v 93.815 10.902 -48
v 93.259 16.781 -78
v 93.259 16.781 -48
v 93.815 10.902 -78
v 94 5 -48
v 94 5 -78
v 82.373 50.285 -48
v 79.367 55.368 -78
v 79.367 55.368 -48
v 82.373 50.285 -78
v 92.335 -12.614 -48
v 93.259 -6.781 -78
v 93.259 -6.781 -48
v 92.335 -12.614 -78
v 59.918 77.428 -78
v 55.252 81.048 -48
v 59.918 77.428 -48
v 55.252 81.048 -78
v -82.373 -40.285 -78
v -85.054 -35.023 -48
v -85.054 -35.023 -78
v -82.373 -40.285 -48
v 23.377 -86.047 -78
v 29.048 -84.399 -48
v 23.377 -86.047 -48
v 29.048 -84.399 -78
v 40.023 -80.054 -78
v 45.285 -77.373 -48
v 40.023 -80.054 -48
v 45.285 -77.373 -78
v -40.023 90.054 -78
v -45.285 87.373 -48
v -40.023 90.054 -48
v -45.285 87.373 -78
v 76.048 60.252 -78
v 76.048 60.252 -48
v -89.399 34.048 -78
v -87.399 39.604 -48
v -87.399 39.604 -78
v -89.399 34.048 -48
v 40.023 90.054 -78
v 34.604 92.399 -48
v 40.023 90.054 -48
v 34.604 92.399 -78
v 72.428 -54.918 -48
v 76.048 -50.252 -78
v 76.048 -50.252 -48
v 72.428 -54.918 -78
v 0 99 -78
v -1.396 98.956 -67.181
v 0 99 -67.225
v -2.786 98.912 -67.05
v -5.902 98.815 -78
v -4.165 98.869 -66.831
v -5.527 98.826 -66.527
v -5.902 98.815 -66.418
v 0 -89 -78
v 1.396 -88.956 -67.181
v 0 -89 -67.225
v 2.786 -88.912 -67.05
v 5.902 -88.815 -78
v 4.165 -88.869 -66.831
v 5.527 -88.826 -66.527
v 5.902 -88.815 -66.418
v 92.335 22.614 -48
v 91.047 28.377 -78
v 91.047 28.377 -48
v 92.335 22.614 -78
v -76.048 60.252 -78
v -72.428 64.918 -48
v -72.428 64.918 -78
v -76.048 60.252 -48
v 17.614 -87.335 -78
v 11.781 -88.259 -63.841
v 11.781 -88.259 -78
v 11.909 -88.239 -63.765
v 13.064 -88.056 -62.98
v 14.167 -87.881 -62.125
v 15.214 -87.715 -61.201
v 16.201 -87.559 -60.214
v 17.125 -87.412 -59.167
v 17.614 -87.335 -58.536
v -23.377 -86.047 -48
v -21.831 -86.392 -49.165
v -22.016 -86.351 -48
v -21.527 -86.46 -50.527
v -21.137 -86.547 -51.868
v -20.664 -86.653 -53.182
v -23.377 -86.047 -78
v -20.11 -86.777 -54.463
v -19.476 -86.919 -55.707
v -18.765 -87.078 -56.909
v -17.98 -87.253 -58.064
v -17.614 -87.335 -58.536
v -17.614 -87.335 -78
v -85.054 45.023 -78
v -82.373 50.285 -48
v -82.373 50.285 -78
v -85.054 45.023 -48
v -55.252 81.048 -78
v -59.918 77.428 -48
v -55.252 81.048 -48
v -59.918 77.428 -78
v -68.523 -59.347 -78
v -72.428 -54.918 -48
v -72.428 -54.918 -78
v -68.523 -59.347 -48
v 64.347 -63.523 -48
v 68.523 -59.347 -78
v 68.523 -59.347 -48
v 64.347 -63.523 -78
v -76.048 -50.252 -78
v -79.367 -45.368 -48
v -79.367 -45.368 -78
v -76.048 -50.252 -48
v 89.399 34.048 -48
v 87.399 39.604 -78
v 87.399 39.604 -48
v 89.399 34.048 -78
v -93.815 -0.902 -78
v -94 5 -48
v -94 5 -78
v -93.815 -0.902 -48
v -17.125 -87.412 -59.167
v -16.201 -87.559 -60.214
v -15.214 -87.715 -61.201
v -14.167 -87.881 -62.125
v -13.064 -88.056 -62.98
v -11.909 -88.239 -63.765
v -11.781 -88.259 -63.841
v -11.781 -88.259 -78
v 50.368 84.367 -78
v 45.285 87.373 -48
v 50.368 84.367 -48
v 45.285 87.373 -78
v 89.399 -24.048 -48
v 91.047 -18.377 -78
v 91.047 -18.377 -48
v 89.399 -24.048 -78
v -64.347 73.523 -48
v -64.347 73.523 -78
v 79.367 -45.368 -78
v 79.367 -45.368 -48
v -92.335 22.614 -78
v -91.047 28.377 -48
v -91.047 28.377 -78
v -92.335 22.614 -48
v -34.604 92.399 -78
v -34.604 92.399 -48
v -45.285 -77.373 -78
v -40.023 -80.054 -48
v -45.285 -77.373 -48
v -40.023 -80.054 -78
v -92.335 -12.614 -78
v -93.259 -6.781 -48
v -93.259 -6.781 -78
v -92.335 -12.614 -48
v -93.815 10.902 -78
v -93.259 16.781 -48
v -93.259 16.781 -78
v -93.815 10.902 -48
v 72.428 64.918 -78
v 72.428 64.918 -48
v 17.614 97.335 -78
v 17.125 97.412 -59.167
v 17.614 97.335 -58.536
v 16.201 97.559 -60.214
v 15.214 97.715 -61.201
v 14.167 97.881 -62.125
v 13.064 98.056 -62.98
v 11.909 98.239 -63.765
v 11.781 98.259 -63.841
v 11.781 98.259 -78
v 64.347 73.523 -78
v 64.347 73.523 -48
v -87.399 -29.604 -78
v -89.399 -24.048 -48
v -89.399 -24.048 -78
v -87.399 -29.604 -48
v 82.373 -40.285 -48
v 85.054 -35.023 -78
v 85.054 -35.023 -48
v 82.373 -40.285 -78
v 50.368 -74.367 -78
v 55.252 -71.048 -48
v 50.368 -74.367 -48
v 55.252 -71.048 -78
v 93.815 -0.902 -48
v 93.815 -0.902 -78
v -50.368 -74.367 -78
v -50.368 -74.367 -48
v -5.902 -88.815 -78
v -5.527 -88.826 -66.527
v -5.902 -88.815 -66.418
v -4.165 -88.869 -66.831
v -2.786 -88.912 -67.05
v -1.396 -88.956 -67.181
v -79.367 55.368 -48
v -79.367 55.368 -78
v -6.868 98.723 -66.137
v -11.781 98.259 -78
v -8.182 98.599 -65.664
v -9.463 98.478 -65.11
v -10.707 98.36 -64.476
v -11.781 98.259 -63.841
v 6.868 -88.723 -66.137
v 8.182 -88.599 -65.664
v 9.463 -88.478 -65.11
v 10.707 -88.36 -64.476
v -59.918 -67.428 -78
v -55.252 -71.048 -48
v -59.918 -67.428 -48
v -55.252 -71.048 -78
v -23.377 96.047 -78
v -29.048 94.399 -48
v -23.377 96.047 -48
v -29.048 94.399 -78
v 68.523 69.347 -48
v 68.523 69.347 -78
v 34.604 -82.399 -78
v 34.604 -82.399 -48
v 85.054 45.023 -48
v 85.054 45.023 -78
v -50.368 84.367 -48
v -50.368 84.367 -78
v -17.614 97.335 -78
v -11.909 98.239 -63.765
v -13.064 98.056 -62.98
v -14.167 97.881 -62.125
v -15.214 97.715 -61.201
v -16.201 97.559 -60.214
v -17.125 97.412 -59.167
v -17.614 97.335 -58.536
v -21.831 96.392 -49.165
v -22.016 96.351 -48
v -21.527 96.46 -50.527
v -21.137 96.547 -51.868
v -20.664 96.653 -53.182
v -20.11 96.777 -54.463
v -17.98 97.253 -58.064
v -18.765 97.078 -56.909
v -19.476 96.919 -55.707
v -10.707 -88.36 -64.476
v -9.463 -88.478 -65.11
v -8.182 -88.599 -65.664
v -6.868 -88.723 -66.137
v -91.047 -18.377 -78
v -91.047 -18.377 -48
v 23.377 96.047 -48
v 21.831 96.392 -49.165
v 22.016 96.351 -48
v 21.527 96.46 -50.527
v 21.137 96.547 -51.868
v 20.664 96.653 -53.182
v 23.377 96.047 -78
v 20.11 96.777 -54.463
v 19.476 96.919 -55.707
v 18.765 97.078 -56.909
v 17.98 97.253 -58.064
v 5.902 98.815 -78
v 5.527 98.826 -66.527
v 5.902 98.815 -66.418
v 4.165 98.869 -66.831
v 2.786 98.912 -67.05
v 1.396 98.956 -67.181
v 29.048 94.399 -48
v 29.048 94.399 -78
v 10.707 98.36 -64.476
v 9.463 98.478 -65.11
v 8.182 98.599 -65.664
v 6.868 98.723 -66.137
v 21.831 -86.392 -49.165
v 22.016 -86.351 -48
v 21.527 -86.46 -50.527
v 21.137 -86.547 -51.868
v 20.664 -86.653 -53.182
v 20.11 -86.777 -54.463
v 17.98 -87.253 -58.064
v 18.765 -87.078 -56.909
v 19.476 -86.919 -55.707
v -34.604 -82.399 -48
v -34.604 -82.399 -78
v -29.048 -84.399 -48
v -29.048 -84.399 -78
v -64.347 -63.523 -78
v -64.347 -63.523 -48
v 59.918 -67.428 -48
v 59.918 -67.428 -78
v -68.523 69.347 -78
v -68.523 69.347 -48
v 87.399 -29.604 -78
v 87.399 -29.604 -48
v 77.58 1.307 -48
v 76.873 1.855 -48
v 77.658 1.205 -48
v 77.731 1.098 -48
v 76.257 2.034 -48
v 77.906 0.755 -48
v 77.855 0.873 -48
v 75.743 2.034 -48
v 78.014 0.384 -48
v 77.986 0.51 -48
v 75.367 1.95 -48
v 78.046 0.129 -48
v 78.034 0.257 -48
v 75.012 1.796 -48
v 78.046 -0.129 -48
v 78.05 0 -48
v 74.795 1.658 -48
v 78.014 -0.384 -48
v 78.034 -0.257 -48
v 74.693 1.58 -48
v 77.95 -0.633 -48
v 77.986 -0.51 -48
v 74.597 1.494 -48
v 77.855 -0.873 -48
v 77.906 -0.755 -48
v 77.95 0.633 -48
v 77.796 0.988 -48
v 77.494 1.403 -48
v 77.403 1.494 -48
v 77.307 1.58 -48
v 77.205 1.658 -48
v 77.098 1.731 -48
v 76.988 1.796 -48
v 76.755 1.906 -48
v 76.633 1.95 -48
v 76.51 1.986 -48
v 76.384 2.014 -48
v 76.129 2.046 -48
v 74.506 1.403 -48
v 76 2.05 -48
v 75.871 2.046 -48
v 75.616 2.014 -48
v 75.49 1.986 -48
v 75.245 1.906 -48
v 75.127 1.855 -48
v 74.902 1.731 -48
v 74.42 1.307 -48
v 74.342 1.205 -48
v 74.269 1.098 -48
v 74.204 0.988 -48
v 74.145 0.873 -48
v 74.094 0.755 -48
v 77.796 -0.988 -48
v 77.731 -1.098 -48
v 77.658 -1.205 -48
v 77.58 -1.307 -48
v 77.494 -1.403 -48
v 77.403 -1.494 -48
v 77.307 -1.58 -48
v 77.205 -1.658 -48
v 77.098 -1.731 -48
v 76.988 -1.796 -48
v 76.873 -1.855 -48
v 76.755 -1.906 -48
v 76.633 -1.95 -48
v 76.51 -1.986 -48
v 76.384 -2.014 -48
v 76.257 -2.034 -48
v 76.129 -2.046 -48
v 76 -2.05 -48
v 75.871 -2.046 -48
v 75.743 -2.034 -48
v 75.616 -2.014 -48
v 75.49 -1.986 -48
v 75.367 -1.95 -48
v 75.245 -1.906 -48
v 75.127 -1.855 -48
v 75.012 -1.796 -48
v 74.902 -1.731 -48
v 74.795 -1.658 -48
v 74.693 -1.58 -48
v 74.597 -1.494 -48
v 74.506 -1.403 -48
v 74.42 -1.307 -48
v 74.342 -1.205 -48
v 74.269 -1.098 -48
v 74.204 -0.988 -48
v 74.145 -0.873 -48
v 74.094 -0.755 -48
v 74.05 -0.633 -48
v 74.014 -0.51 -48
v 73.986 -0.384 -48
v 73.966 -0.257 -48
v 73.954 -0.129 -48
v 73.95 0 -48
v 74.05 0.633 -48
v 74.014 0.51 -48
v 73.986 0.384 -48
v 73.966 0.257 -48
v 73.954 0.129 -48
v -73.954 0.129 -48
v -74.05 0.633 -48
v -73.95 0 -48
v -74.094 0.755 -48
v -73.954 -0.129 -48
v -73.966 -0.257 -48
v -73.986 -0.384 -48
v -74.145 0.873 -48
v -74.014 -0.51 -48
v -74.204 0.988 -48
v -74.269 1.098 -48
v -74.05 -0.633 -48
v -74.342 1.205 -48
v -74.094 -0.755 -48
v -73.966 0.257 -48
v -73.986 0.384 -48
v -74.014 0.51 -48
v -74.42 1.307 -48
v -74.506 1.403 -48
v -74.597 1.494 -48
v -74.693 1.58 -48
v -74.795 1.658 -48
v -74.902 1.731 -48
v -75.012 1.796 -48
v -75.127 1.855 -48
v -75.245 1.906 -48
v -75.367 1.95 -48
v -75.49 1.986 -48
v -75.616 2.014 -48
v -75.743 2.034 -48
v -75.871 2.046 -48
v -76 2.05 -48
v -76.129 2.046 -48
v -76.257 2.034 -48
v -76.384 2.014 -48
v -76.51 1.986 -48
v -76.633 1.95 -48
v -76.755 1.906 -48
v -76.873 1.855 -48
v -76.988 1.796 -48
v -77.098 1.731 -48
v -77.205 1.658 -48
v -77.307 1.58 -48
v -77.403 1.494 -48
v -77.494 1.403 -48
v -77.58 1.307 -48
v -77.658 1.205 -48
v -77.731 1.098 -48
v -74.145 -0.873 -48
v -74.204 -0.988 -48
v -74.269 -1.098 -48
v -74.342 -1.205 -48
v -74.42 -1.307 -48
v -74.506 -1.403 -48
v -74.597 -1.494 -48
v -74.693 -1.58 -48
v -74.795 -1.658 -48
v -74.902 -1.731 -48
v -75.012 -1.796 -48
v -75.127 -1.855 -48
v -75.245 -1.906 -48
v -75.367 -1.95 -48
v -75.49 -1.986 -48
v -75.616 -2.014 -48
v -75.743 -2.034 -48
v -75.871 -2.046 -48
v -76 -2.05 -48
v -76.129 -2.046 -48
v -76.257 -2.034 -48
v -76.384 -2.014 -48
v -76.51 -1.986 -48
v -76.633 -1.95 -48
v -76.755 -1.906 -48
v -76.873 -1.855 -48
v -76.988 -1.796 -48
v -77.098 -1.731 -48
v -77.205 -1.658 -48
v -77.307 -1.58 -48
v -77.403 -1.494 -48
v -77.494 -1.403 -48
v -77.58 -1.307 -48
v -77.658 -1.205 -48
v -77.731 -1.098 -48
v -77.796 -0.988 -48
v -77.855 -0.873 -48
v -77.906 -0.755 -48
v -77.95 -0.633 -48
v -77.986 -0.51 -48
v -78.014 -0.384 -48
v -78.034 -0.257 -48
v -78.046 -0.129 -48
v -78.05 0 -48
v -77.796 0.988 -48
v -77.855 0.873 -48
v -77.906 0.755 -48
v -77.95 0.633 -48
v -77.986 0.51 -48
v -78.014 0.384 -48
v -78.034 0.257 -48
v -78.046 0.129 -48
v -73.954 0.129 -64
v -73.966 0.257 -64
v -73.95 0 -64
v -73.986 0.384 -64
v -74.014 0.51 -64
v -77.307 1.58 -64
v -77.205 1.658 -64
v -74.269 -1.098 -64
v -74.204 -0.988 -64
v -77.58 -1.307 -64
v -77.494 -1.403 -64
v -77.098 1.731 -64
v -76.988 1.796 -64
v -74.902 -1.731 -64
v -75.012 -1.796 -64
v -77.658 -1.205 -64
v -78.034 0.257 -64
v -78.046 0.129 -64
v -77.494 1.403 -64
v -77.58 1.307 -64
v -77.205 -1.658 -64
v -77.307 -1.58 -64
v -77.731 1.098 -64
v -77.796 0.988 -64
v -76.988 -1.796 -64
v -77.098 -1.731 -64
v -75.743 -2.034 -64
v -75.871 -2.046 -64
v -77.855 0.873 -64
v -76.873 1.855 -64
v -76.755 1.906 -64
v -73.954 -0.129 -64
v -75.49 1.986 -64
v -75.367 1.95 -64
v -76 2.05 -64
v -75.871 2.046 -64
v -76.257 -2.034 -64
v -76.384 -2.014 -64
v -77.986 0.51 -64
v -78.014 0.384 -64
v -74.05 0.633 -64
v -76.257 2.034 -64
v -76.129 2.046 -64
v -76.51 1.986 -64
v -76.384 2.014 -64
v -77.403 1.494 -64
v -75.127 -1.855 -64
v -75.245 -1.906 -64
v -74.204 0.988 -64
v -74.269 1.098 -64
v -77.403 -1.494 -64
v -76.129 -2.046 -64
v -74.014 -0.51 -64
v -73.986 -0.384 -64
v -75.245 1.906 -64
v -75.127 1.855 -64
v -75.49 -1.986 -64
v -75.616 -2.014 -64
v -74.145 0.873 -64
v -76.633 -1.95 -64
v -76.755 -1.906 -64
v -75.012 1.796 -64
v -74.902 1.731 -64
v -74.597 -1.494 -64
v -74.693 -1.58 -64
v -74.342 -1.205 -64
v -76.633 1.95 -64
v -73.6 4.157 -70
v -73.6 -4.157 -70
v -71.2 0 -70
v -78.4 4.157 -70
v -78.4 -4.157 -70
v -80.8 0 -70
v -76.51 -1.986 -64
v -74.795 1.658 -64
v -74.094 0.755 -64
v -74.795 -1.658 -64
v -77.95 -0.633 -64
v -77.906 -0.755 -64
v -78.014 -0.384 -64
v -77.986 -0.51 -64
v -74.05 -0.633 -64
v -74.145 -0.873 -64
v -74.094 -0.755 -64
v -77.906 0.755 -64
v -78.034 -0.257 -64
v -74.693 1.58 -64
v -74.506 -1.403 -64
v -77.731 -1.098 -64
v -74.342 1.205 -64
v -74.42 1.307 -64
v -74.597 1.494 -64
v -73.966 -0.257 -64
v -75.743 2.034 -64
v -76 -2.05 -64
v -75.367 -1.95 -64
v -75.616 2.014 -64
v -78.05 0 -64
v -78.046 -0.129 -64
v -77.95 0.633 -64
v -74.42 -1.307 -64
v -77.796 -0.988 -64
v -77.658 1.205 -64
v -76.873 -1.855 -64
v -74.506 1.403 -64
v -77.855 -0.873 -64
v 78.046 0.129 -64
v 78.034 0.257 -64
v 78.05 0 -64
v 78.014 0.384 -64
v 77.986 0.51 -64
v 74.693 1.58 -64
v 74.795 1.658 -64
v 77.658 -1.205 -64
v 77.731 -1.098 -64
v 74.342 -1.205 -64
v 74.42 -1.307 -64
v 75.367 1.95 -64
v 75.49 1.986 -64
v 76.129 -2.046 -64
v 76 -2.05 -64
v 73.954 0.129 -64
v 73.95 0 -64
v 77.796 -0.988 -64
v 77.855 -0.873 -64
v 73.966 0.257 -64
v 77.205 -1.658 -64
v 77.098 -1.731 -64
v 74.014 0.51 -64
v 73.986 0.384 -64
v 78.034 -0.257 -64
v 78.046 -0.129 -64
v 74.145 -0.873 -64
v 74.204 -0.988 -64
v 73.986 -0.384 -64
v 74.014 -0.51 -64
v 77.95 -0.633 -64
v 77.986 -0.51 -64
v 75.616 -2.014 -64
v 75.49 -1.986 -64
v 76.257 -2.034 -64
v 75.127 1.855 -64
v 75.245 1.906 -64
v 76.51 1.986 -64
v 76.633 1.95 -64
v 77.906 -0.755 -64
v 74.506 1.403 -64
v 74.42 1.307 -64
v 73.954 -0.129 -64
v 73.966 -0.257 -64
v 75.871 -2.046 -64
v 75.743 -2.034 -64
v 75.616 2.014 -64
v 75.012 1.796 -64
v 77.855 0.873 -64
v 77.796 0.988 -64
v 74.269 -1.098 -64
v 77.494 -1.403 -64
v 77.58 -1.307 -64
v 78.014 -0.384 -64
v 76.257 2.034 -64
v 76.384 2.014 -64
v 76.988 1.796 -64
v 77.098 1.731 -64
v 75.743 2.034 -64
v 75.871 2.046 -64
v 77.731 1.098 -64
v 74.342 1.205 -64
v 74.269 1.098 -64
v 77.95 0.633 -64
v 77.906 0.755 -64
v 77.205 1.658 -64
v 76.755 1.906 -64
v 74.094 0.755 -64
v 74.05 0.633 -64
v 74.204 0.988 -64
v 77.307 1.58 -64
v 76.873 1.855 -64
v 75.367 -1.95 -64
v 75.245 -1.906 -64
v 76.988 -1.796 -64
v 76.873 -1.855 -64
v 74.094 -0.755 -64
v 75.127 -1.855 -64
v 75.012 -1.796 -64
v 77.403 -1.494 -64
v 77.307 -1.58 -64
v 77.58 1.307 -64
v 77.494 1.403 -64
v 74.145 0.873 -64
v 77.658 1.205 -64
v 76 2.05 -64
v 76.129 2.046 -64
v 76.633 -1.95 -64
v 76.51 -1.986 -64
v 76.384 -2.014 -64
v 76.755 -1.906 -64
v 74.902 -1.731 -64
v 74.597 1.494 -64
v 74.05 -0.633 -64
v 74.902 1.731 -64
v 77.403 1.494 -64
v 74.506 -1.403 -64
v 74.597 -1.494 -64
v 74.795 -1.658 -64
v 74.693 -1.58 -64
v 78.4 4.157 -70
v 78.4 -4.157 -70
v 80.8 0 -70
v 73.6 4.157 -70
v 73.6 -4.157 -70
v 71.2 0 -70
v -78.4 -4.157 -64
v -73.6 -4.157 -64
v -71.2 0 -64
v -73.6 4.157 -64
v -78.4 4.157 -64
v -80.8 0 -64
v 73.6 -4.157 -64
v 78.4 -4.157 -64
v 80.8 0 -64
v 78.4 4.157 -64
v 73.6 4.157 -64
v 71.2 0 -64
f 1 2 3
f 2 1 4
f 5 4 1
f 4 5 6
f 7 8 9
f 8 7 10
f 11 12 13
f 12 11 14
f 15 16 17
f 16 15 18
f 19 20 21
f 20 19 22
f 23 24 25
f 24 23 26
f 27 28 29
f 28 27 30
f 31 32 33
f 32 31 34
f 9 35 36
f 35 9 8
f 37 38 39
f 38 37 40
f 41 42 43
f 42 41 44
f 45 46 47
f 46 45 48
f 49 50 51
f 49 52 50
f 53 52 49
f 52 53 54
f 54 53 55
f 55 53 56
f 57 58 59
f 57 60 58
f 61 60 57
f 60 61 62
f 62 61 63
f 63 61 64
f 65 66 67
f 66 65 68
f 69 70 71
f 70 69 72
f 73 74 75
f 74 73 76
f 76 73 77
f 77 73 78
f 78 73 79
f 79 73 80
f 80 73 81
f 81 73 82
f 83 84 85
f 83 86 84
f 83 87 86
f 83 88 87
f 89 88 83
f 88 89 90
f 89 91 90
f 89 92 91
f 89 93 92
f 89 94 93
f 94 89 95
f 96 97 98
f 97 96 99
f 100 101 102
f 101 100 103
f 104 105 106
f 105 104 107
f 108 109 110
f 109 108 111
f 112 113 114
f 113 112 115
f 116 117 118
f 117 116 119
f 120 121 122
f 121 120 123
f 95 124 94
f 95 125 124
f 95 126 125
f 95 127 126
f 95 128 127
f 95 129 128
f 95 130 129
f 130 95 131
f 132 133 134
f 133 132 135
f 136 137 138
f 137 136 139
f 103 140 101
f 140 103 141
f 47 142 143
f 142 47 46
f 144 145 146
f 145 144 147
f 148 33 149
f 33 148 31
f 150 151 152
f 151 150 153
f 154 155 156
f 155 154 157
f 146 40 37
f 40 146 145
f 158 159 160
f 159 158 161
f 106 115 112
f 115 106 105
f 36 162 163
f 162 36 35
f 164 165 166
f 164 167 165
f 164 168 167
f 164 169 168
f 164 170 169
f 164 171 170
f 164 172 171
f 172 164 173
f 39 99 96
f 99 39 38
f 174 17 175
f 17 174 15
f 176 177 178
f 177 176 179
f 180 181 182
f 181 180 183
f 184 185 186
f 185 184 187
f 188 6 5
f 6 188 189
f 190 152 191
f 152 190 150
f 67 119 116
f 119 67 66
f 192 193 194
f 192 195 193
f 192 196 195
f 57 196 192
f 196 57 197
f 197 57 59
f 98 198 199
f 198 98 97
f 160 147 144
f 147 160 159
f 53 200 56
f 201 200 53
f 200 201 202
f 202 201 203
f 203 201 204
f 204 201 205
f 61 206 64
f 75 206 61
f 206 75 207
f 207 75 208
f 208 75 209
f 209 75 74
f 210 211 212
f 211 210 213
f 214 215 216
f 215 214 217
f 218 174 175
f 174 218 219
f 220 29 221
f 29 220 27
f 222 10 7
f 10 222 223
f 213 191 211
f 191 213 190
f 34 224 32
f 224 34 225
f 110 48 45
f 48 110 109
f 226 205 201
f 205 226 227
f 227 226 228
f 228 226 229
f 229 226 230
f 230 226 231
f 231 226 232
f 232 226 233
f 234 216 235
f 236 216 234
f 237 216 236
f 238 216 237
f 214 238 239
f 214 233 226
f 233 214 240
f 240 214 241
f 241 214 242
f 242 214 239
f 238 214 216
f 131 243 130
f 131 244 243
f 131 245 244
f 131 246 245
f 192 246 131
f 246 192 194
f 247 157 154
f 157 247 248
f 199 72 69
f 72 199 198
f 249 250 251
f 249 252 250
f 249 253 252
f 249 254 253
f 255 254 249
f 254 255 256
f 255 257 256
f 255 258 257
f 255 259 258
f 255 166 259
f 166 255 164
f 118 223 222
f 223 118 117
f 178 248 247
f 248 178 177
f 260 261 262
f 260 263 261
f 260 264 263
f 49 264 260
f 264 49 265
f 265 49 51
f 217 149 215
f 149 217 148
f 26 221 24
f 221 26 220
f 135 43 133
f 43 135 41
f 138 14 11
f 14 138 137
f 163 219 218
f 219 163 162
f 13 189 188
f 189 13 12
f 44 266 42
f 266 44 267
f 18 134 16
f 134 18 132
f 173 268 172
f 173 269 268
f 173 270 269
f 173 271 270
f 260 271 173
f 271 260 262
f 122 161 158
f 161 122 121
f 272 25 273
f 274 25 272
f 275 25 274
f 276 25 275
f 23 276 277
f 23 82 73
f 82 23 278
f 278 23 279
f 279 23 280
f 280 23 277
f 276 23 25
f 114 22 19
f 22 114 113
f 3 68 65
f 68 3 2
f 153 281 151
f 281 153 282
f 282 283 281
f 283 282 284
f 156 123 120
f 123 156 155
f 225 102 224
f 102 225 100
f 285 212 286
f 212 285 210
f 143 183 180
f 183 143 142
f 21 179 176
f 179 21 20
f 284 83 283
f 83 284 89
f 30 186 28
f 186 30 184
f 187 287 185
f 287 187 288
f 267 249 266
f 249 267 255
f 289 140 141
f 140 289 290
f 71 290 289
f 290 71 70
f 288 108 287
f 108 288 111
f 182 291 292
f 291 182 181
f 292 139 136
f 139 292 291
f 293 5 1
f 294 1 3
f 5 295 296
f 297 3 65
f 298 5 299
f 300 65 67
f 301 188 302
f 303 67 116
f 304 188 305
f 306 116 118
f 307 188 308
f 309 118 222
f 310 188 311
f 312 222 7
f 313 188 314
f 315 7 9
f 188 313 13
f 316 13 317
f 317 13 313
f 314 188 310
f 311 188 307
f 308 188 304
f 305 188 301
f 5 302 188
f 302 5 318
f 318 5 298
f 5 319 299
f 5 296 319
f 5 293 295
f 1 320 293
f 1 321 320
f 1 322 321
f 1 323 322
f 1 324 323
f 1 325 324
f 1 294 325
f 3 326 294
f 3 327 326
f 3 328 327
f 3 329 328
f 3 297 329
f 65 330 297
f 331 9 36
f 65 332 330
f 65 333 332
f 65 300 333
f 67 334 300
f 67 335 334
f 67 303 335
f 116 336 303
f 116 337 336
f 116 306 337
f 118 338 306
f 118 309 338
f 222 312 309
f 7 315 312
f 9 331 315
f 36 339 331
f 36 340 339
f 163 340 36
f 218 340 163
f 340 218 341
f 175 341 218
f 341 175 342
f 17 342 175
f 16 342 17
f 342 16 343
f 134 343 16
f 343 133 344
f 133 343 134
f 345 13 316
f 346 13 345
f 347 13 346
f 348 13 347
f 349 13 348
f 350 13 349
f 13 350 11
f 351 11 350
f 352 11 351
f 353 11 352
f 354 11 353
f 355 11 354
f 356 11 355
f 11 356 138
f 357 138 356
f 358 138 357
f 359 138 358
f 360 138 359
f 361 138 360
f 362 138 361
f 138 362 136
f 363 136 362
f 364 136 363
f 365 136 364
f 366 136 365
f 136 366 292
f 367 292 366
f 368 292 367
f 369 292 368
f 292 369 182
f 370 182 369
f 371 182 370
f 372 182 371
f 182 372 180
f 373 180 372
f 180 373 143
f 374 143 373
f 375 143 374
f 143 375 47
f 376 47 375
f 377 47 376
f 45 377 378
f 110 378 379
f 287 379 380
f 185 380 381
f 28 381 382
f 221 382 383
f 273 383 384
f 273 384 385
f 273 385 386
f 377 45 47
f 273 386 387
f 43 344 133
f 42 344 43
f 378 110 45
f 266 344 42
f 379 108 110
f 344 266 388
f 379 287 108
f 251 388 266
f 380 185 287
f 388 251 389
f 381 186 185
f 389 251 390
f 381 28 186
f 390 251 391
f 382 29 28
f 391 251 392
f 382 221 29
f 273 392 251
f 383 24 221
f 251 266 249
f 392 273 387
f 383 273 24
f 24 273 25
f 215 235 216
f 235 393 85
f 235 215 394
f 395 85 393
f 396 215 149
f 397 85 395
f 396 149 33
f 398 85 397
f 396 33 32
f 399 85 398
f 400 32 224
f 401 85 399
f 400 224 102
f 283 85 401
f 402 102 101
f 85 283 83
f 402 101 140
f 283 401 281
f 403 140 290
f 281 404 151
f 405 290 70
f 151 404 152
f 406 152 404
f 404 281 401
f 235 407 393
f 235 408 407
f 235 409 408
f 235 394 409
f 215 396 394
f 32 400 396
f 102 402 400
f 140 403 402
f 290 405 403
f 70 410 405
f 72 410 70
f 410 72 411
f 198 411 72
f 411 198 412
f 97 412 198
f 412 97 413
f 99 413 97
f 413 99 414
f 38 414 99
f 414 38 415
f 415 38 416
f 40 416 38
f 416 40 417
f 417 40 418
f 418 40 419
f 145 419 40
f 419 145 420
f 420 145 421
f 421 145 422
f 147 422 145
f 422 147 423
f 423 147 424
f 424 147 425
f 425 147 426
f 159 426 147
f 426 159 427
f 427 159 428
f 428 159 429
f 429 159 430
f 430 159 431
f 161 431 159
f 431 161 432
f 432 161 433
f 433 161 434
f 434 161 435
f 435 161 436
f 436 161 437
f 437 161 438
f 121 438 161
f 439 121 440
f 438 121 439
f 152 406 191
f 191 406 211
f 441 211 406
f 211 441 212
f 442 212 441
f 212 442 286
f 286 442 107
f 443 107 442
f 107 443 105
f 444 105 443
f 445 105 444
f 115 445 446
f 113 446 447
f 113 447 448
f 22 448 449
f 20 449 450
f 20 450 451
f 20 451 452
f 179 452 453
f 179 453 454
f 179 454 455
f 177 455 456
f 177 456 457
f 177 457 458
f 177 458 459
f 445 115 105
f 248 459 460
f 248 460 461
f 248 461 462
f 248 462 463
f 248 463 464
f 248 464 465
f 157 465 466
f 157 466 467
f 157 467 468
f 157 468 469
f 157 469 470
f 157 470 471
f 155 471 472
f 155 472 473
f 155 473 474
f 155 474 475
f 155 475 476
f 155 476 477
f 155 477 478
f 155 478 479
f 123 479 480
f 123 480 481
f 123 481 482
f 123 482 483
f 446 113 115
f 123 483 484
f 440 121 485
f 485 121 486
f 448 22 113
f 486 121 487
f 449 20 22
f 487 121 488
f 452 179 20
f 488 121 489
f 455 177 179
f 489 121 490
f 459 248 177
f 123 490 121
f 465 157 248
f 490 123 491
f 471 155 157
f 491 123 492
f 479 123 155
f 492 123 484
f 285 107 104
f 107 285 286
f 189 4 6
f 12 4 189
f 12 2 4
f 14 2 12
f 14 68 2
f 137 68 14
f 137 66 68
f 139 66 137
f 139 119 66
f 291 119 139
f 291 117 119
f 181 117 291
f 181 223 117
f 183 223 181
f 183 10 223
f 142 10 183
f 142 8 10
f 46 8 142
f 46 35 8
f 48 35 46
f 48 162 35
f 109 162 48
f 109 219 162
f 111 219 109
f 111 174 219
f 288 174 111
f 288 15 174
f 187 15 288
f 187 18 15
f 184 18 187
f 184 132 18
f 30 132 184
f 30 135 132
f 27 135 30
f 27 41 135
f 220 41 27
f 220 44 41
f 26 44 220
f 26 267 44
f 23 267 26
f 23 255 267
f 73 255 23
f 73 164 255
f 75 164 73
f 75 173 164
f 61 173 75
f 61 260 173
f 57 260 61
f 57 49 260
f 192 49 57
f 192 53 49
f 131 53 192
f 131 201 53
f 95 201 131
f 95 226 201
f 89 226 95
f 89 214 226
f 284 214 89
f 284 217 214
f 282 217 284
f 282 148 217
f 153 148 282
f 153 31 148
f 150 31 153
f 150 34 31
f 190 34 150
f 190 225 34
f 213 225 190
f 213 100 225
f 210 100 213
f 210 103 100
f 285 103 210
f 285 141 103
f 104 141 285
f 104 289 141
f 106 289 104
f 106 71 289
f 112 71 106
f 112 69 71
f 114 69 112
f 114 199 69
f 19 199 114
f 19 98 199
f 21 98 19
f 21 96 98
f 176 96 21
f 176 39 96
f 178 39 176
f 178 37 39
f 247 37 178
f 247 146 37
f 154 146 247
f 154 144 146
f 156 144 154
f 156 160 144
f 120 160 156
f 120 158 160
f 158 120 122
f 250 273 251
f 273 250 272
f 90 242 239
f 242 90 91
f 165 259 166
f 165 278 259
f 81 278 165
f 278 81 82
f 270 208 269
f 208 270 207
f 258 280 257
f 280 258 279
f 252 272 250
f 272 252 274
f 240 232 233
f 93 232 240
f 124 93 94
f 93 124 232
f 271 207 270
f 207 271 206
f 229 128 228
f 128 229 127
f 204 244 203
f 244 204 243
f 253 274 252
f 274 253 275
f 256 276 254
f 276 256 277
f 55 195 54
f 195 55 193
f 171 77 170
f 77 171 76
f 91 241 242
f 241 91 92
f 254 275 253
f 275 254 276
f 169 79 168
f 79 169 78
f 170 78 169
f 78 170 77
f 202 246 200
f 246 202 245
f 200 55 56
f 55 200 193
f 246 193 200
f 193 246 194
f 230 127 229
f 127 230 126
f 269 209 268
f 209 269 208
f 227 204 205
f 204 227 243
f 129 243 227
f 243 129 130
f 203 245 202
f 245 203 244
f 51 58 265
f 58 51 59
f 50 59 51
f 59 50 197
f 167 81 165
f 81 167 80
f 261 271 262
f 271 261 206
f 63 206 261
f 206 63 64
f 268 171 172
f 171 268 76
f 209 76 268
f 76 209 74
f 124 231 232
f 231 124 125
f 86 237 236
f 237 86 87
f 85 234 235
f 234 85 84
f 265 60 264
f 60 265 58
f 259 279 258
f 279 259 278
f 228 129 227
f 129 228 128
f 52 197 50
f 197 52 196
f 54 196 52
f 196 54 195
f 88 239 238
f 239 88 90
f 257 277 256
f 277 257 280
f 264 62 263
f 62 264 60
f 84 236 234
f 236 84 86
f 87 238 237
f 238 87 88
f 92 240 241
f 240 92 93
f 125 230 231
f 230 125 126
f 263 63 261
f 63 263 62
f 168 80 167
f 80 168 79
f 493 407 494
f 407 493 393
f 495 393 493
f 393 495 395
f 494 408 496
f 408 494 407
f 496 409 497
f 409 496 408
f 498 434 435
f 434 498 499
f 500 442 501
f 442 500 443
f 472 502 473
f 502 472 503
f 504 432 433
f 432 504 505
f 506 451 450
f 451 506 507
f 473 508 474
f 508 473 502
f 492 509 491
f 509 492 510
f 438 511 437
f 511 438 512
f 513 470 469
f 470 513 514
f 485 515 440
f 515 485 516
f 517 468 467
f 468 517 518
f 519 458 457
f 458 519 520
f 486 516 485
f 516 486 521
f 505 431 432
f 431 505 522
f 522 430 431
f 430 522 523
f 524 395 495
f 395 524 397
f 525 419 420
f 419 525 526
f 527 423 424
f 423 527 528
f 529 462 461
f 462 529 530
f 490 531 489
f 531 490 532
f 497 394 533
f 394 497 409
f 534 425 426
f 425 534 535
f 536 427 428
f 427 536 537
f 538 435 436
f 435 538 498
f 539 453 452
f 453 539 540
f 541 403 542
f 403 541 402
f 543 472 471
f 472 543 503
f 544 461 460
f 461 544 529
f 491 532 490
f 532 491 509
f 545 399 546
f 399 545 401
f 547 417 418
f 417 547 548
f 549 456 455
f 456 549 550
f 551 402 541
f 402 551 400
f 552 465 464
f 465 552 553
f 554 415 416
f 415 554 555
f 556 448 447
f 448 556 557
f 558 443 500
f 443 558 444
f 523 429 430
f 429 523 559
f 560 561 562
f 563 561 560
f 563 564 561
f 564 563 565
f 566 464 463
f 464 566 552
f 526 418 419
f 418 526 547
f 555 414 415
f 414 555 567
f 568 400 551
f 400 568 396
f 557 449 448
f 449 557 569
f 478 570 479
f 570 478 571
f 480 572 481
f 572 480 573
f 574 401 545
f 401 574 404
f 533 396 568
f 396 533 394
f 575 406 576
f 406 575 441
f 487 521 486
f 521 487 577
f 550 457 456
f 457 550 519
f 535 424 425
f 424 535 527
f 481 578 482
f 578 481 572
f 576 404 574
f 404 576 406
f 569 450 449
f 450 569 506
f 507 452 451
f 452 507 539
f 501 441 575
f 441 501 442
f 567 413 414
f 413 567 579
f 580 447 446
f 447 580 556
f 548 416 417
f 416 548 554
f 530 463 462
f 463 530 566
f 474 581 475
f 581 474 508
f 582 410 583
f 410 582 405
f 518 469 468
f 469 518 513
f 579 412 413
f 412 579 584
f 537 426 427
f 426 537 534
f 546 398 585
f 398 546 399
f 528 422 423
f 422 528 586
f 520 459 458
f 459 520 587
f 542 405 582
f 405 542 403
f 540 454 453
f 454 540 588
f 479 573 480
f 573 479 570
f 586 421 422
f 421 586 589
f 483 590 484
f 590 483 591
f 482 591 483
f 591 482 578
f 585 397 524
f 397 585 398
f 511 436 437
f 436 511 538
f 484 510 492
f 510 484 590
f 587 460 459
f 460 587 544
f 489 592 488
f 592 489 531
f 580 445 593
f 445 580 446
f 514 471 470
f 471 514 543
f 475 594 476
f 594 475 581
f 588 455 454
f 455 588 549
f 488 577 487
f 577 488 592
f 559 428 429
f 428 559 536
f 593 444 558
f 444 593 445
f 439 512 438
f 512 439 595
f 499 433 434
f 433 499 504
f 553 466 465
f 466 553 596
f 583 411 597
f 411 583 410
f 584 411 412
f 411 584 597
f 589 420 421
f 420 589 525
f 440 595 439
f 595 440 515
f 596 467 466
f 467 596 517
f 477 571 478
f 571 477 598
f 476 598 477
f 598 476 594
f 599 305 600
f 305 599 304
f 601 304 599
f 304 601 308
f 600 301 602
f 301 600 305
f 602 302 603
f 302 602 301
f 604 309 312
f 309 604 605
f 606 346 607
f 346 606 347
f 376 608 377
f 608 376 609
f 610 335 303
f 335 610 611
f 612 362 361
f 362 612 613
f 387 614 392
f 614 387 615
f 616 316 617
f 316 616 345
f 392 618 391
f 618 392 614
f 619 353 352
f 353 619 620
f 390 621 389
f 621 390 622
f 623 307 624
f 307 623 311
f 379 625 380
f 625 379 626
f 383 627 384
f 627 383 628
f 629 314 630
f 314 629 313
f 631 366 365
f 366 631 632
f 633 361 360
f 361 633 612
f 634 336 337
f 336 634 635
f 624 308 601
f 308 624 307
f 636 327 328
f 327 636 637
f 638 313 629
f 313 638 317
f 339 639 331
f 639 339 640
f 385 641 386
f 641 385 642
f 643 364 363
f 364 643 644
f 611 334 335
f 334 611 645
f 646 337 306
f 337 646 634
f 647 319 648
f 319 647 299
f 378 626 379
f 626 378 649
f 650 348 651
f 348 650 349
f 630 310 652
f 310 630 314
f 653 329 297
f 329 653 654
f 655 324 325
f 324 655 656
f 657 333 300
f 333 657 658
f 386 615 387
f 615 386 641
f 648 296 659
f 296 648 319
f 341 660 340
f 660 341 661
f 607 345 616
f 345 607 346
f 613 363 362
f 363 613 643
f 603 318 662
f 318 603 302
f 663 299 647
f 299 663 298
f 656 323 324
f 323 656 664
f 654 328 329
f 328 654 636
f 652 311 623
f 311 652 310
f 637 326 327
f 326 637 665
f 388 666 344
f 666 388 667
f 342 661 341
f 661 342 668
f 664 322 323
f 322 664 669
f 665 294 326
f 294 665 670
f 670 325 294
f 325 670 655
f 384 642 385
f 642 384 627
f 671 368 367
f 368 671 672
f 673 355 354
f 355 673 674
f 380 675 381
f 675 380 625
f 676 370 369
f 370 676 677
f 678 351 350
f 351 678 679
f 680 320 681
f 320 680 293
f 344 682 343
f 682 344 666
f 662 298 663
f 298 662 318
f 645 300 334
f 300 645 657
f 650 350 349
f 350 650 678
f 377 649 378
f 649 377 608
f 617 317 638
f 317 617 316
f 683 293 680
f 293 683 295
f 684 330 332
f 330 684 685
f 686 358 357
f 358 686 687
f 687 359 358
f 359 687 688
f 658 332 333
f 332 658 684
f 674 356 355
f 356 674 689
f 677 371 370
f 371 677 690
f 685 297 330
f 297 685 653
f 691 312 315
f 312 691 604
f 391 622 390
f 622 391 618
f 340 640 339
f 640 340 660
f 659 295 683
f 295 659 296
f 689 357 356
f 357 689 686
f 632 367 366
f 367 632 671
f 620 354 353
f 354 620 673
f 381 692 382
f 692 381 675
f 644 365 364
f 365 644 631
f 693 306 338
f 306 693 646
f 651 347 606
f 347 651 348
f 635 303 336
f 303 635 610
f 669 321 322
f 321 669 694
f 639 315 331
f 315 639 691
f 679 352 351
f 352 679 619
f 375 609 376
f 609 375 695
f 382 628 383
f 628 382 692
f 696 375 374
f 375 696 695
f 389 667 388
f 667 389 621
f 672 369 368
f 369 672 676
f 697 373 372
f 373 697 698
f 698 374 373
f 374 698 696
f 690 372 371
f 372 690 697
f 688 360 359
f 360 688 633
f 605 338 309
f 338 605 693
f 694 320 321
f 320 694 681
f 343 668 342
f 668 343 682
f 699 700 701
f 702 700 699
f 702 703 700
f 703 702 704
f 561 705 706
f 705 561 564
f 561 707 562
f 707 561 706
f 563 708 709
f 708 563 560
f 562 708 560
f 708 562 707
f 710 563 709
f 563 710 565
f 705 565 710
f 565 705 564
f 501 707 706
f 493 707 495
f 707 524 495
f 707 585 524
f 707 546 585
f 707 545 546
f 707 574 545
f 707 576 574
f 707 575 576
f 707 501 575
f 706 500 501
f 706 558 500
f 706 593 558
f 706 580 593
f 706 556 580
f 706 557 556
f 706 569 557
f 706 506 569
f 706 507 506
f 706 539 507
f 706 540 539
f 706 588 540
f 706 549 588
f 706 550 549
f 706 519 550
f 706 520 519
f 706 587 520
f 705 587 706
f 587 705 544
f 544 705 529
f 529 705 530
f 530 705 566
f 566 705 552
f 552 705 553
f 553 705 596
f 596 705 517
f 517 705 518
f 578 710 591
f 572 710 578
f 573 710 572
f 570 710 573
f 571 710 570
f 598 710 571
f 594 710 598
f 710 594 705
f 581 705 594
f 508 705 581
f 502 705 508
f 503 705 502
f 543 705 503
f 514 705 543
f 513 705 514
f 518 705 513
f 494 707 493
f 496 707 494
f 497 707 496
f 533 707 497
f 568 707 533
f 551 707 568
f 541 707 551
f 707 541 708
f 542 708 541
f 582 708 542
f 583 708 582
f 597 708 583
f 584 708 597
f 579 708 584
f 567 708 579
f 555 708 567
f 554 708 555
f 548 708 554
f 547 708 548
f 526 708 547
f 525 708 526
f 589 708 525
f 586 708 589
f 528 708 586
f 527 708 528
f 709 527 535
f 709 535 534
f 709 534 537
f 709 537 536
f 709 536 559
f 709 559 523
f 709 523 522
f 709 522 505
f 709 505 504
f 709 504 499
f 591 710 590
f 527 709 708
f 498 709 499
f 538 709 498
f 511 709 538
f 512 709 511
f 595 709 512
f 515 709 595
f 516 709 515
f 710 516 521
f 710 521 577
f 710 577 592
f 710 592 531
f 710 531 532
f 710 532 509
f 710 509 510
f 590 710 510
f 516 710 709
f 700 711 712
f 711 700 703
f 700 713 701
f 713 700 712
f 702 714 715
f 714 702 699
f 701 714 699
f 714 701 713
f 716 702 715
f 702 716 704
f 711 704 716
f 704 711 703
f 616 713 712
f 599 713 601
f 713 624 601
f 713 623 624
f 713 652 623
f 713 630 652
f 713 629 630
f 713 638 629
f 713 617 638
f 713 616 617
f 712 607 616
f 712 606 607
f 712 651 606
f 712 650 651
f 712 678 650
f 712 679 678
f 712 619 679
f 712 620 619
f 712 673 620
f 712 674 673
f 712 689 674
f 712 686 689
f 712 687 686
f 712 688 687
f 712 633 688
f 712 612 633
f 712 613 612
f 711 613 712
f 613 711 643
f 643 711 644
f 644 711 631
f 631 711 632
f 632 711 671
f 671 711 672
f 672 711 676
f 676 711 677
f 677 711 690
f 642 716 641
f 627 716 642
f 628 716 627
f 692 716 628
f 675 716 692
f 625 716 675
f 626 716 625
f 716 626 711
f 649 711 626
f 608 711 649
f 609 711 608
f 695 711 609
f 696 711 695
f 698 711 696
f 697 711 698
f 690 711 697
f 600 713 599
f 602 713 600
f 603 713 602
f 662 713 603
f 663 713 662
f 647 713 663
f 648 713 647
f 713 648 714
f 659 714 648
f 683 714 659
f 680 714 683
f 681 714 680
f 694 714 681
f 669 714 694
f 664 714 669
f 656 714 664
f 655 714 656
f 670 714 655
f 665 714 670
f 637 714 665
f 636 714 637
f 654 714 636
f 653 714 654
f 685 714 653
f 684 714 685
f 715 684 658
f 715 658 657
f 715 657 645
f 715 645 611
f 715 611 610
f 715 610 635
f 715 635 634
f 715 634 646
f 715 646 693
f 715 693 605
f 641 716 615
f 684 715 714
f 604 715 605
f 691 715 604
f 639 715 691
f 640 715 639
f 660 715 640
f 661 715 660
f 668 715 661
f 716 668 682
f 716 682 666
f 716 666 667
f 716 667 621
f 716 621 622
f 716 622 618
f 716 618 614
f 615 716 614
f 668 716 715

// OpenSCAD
//BIRD BATH WITH DIFFERENT LEVELS
//By Coat 2019

//use <text_on_OpenSCAD/text_on.scad>  //used library

//---------
//parameters
//smoothness
  $fn=100;               
//radius outside 
  rad0=100;              
//total height 
  h0 = 70;               
//radius innercircles  
  rad1=60;               
  rad2=60;
  rad3=60;

//distance innercylinders from bottom
  tz1=25;                
  tz2=40;
  tz3=55; 
//offset innercircle from middle
  ty1=25;               
  ty2=25;
  ty3=25;
//rotation innercircle around middle
  rot1=0;             
  rot2=120;
  rot3=240;
//width/height mitered edge
  mit=4;               
//text on side
  text="I tawt I taw a puddy tat!****";
  //text="Customizable text!****";
  //text="*****************************";
  //text=":::::::::::::::::::::::::::::";
  
//darryl's variables
extension_height = 20;
spool_mount_x = 0;
spool_mount_y = 8;
spool_mount_z = 0;

//mount
//rail size
rail_size = 114.3;
clamp_width = 180;
clamp_depth = 30;
clamp_height = 30;
clamp_x = -clamp_width/2;
clamp_y = -clamp_depth/2;
clamp_z = -clamp_height-12;
clamp_space = 6;

//bolt holes
bolt_length = 50;
bolt_size = 4.1 ;
nut_size = 9.6;
nut_height = 6;

//bolt heads
head_dia = 6.7;
head_length = 4.1;

arch_base   = 4;
arch_angle  = 160;
arch_radius = 15;

//The bath
module the_bath() {
  translate([ 0, 0, +7 ]) {
difference()
{
    union()
    {
        base_lock();
  //body with text  
  mitercyl(rad0,h0,mit,0);
    }
  
  translate([ 0, 0, +20 ])  
  cylinder( h = 51, r = 90 );
  //text_on_cylinder(t=text,r1=rad0, r2=rad0, h=25, font="impact", direction="ttb", size=27, extrusion_height = 2);

  //grooves in bottom
/*  rotate([0,0,0])
    cube([3,3*rad0,mit], center = true);
  rotate([0,0,120])
    cube([3,3*rad0,mit], center = true);
  rotate([0,0,240])
    cube([3,3*rad0,mit], center = true);
*/
  //innercircles
/*
  rotate([0,0,rot1])
    translate([0,ty1,tz1])
      mitercyl(rad1,h0,0,mit);
  rotate([0,0,rot2])
    translate([0,ty2,tz2])
      mitercyl(rad2,h0,0,mit);
  rotate([0,0,rot3])
    translate([0,ty3,tz3])
      mitercyl(rad3,h0,0,mit);
*/    
    }
}
}


// base lock
module base_lock(){
    
rotate([ 90, 0, 0 ]) {
difference() {    
            union() {
                translate([ 0, -extension_height/2-2, 0 ])
                rotate([ 270, 0, 0 ])
                mitercyl(rad0,extension_height,0,mit);
                //cylinder( h = 20, r = 50, center = true);
//            translate([arm_x, arm_y, arm_z]) cube([20, 20, arm_length]);
            translate([spool_mount_x, spool_mount_y, spool_mount_z]) 
                rotate([90, 0, 0]) 
                cylinder(h = 20, d = 36.6 );
            translate([spool_mount_x+16, spool_mount_y-17.2, spool_mount_z+2.2]) 
                rotate([90, 78, 180]) 
                linear_extrude(height = 4) {
                polygon(points = [[0, 1], [4, 0], [3.5, 2], [3, 4]]);
            }
            translate([spool_mount_x-16.1, spool_mount_y-13, spool_mount_z+2.2]) 
            rotate([90, 78, 0]) 
            linear_extrude(height = 4) {
                polygon(points = [[0, 1], [4, 0], [3.5, 2], [3, 4]]);
            }
        }

        translate([spool_mount_x, spool_mount_y+1, spool_mount_z]) 
        rotate([90, 0, 0]) 
        cylinder(h = 22, d = 30.3);
                }
 
 
//add spool stops
difference() {
    union() {
        translate([spool_mount_x+16, spool_mount_y-17.2, spool_mount_z+2.2]) 
        rotate([90, 78, 180]) 
        linear_extrude(height = 4) {
            polygon(points = [[0, 1], [4, 0], [3.5, 2], [3, 4]]);
        }
        translate([spool_mount_x-16.1, spool_mount_y-13, spool_mount_z+2.2]) 
        rotate([90, 78, 0]) 
        linear_extrude(height = 4) {
            polygon(points = [[0, 1], [4, 0], [3.5, 2], [3, 4]]);
        }
    }
    translate([spool_mount_x+10.9, spool_mount_y-12.9, spool_mount_z+.2]) 
    rotate([90, 0, 0]) 
    cylinder(h = 5, r = 2.5);
    
    translate([spool_mount_x-11, spool_mount_y-12.9, spool_mount_z+.2]) 
    rotate([90, 0, 0]) 
    cylinder(h = 5, r = 2.5);
        }
    }
}

//used modules
module mitercyl(rad,hei,mtop, mbot)
{
  cylinder(r1=rad-mbot, r2 = rad, h=abs(mbot));
  translate([0,0,abs(mbot)])
    cylinder(r=rad, h=hei-abs(mtop)-abs(mbot));
  translate([0,0,hei-abs(mtop)])
    cylinder(r1=rad, r2=rad-mtop, h=abs(mtop));
}
module mount_top()
{
    difference() {
        union()
        {
            //rail clamps
            //translate([ clamp_x+90, clamp_y+20, -30 ])
                //cube([ clamp_width, clamp_depth, clamp_height ], center = true);
                cylinder( h = clamp_height, r = rad0-6 );
            translate([ -clamp_x-clamp_width/2, clamp_y+20, clamp_height+5 ])
            twist_lock();
        
        }
        //rail hole
        translate([ 0, clamp_y, -clamp_height+clamp_height ])
        rotate([ 270, 0, 0 ])
            cylinder( h = 400, r = 44.45/2, center = true );
        
        //bolt holes
        translate([ -clamp_width/2+14, 0, -clamp_height+clamp_height ])
        cylinder( h = bolt_length, r = bolt_size/2, center = true );
        translate([ clamp_width/2-14, 0, -clamp_height+clamp_height ])
        cylinder( h = bolt_length, r = bolt_size/2, center = true );
        
        //sunken heads
        translate([ -clamp_width/2+14, 0, clamp_height-2 ])
        cylinder( h = head_length, r = head_dia/2, center = true );
        translate([ clamp_width/2-14, 0, clamp_height-2 ])
        cylinder( h = head_length, r = head_dia/2, center = true );
        
        //nuts
        /*
        translate([ -clamp_width/2+14, 0, clamp_z+clamp_height-6 ])
        cylinder( h = 10, r = 11.1, $fn = 6, center = true );
        translate([ clamp_width/2-14, 0, clamp_z+clamp_height-6 ])
        cylinder( h = 10, r = 11.1, $fn =6, center = true );
    */
        }
        
}

module mount_bottom() {
    difference() {
        union()
        {
            //rail clamps
            translate([ clamp_x+90, clamp_y+20, clamp_z-clamp_height-clamp_space ])
                //cube([ clamp_width, clamp_depth, clamp_height ], center = false);
            cylinder( h = clamp_height, r = rad0-6 );
        }
        //rail hole
        translate([ 0, clamp_y, clamp_z-clamp_space/2 ])
        rotate([ 270, 0, 0 ])
            cylinder( h = 480, r = 44.45/2, center = true );
        
        //bolt holes
        translate([ -clamp_width/2+14, 0, clamp_z-3 ])
        cylinder( h = bolt_length, r = bolt_size/2, center = true );
        translate([ clamp_width/2-14, 0, clamp_z-3 ])
        cylinder( h = bolt_length, r = bolt_size/2, center = true );
        
        //nuts
        
        translate([ -clamp_width/2+14, 0, clamp_z-25 ])
        cylinder( h = nut_height, r = nut_size/2, center = true, $fn=6 );
        translate([ clamp_width/2-14, 0, clamp_z-25 ])
        cylinder( h = nut_height, r = nut_size/2, center = true, $fn=6 );
        
        
        //bolt head inset
        /*
        translate([ -clamp_width/2+14, 0, clamp_z-clamp_height-clamp_space-2 ])
        cylinder( h = head_height, r = head_rad, center = false );
        translate([ clamp_width/2-14, 0, clamp_z-clamp_height-clamp_space-2 ])
        cylinder( h = head_height, r = head_rad, center = false );
        */
    }
}

module twist_lock() 
{
    
//translate([ 0, 0, -clamp_height+75 ]) {
difference() {
    union() {
        cylinder(h = 10, d = 29.8, center = true);
    }
    //translate([0, 0, 0])
   //center cutout 
    cylinder(10.2, r = 6, center = true);
    
// guides
    rotate( [0, 0, 0])
        rotate_extrude( angle = arch_angle, $fn = 100 )
        translate( [-arch_radius, 0] )
        difference()
        translate( [0, -arch_base / 2] )
            square( arch_base );
    
    rotate( [180, 180, 0])
        rotate_extrude( angle = arch_angle, $fn = 100 )
        translate( [-arch_radius, 0] )
        difference()
        translate( [0, -arch_base / 2] )
            square( arch_base );
        
    //Add entrance notches
    mirror([ 10, 60, 0 ])
    rotate( [180, 180, 0])
        rotate_extrude( angle = 20, $fn = 100 )
        translate( [-arch_radius, 0] )
        difference()
        translate( [0, -arch_base / 2.2] )
        square( [4, 7] );
    mirror([ 10, 60, 0 ])
    rotate( [180, 180, 0])
        rotate_extrude( angle = 20, $fn = 100 )
        translate( [-arch_radius, 0] )
        difference()
        translate( [0 + 26.1, -arch_base / 2.2] )
            square( [4, 7] );
}    

//Add a bump
    union()
        mirror([ 200, -30, 0 ])
        translate ([9, -6, 0]) 
            cylinder(4, r = 1, center =true);
        mirror([ 200, -30, 0 ])        
        translate ([-9, 6, 0]) 
            cylinder(4, r = 1, center =true);
}

//Twist bar
module twist_bar() {
    translate([ 0, 0, -7 ])
cube([ 30, 30, 5 ], center = true);
}

//}
//the_bath();
//base_lock();
//mount_top();
mount_bottom();
//twist_lock();
//twist_bar();
